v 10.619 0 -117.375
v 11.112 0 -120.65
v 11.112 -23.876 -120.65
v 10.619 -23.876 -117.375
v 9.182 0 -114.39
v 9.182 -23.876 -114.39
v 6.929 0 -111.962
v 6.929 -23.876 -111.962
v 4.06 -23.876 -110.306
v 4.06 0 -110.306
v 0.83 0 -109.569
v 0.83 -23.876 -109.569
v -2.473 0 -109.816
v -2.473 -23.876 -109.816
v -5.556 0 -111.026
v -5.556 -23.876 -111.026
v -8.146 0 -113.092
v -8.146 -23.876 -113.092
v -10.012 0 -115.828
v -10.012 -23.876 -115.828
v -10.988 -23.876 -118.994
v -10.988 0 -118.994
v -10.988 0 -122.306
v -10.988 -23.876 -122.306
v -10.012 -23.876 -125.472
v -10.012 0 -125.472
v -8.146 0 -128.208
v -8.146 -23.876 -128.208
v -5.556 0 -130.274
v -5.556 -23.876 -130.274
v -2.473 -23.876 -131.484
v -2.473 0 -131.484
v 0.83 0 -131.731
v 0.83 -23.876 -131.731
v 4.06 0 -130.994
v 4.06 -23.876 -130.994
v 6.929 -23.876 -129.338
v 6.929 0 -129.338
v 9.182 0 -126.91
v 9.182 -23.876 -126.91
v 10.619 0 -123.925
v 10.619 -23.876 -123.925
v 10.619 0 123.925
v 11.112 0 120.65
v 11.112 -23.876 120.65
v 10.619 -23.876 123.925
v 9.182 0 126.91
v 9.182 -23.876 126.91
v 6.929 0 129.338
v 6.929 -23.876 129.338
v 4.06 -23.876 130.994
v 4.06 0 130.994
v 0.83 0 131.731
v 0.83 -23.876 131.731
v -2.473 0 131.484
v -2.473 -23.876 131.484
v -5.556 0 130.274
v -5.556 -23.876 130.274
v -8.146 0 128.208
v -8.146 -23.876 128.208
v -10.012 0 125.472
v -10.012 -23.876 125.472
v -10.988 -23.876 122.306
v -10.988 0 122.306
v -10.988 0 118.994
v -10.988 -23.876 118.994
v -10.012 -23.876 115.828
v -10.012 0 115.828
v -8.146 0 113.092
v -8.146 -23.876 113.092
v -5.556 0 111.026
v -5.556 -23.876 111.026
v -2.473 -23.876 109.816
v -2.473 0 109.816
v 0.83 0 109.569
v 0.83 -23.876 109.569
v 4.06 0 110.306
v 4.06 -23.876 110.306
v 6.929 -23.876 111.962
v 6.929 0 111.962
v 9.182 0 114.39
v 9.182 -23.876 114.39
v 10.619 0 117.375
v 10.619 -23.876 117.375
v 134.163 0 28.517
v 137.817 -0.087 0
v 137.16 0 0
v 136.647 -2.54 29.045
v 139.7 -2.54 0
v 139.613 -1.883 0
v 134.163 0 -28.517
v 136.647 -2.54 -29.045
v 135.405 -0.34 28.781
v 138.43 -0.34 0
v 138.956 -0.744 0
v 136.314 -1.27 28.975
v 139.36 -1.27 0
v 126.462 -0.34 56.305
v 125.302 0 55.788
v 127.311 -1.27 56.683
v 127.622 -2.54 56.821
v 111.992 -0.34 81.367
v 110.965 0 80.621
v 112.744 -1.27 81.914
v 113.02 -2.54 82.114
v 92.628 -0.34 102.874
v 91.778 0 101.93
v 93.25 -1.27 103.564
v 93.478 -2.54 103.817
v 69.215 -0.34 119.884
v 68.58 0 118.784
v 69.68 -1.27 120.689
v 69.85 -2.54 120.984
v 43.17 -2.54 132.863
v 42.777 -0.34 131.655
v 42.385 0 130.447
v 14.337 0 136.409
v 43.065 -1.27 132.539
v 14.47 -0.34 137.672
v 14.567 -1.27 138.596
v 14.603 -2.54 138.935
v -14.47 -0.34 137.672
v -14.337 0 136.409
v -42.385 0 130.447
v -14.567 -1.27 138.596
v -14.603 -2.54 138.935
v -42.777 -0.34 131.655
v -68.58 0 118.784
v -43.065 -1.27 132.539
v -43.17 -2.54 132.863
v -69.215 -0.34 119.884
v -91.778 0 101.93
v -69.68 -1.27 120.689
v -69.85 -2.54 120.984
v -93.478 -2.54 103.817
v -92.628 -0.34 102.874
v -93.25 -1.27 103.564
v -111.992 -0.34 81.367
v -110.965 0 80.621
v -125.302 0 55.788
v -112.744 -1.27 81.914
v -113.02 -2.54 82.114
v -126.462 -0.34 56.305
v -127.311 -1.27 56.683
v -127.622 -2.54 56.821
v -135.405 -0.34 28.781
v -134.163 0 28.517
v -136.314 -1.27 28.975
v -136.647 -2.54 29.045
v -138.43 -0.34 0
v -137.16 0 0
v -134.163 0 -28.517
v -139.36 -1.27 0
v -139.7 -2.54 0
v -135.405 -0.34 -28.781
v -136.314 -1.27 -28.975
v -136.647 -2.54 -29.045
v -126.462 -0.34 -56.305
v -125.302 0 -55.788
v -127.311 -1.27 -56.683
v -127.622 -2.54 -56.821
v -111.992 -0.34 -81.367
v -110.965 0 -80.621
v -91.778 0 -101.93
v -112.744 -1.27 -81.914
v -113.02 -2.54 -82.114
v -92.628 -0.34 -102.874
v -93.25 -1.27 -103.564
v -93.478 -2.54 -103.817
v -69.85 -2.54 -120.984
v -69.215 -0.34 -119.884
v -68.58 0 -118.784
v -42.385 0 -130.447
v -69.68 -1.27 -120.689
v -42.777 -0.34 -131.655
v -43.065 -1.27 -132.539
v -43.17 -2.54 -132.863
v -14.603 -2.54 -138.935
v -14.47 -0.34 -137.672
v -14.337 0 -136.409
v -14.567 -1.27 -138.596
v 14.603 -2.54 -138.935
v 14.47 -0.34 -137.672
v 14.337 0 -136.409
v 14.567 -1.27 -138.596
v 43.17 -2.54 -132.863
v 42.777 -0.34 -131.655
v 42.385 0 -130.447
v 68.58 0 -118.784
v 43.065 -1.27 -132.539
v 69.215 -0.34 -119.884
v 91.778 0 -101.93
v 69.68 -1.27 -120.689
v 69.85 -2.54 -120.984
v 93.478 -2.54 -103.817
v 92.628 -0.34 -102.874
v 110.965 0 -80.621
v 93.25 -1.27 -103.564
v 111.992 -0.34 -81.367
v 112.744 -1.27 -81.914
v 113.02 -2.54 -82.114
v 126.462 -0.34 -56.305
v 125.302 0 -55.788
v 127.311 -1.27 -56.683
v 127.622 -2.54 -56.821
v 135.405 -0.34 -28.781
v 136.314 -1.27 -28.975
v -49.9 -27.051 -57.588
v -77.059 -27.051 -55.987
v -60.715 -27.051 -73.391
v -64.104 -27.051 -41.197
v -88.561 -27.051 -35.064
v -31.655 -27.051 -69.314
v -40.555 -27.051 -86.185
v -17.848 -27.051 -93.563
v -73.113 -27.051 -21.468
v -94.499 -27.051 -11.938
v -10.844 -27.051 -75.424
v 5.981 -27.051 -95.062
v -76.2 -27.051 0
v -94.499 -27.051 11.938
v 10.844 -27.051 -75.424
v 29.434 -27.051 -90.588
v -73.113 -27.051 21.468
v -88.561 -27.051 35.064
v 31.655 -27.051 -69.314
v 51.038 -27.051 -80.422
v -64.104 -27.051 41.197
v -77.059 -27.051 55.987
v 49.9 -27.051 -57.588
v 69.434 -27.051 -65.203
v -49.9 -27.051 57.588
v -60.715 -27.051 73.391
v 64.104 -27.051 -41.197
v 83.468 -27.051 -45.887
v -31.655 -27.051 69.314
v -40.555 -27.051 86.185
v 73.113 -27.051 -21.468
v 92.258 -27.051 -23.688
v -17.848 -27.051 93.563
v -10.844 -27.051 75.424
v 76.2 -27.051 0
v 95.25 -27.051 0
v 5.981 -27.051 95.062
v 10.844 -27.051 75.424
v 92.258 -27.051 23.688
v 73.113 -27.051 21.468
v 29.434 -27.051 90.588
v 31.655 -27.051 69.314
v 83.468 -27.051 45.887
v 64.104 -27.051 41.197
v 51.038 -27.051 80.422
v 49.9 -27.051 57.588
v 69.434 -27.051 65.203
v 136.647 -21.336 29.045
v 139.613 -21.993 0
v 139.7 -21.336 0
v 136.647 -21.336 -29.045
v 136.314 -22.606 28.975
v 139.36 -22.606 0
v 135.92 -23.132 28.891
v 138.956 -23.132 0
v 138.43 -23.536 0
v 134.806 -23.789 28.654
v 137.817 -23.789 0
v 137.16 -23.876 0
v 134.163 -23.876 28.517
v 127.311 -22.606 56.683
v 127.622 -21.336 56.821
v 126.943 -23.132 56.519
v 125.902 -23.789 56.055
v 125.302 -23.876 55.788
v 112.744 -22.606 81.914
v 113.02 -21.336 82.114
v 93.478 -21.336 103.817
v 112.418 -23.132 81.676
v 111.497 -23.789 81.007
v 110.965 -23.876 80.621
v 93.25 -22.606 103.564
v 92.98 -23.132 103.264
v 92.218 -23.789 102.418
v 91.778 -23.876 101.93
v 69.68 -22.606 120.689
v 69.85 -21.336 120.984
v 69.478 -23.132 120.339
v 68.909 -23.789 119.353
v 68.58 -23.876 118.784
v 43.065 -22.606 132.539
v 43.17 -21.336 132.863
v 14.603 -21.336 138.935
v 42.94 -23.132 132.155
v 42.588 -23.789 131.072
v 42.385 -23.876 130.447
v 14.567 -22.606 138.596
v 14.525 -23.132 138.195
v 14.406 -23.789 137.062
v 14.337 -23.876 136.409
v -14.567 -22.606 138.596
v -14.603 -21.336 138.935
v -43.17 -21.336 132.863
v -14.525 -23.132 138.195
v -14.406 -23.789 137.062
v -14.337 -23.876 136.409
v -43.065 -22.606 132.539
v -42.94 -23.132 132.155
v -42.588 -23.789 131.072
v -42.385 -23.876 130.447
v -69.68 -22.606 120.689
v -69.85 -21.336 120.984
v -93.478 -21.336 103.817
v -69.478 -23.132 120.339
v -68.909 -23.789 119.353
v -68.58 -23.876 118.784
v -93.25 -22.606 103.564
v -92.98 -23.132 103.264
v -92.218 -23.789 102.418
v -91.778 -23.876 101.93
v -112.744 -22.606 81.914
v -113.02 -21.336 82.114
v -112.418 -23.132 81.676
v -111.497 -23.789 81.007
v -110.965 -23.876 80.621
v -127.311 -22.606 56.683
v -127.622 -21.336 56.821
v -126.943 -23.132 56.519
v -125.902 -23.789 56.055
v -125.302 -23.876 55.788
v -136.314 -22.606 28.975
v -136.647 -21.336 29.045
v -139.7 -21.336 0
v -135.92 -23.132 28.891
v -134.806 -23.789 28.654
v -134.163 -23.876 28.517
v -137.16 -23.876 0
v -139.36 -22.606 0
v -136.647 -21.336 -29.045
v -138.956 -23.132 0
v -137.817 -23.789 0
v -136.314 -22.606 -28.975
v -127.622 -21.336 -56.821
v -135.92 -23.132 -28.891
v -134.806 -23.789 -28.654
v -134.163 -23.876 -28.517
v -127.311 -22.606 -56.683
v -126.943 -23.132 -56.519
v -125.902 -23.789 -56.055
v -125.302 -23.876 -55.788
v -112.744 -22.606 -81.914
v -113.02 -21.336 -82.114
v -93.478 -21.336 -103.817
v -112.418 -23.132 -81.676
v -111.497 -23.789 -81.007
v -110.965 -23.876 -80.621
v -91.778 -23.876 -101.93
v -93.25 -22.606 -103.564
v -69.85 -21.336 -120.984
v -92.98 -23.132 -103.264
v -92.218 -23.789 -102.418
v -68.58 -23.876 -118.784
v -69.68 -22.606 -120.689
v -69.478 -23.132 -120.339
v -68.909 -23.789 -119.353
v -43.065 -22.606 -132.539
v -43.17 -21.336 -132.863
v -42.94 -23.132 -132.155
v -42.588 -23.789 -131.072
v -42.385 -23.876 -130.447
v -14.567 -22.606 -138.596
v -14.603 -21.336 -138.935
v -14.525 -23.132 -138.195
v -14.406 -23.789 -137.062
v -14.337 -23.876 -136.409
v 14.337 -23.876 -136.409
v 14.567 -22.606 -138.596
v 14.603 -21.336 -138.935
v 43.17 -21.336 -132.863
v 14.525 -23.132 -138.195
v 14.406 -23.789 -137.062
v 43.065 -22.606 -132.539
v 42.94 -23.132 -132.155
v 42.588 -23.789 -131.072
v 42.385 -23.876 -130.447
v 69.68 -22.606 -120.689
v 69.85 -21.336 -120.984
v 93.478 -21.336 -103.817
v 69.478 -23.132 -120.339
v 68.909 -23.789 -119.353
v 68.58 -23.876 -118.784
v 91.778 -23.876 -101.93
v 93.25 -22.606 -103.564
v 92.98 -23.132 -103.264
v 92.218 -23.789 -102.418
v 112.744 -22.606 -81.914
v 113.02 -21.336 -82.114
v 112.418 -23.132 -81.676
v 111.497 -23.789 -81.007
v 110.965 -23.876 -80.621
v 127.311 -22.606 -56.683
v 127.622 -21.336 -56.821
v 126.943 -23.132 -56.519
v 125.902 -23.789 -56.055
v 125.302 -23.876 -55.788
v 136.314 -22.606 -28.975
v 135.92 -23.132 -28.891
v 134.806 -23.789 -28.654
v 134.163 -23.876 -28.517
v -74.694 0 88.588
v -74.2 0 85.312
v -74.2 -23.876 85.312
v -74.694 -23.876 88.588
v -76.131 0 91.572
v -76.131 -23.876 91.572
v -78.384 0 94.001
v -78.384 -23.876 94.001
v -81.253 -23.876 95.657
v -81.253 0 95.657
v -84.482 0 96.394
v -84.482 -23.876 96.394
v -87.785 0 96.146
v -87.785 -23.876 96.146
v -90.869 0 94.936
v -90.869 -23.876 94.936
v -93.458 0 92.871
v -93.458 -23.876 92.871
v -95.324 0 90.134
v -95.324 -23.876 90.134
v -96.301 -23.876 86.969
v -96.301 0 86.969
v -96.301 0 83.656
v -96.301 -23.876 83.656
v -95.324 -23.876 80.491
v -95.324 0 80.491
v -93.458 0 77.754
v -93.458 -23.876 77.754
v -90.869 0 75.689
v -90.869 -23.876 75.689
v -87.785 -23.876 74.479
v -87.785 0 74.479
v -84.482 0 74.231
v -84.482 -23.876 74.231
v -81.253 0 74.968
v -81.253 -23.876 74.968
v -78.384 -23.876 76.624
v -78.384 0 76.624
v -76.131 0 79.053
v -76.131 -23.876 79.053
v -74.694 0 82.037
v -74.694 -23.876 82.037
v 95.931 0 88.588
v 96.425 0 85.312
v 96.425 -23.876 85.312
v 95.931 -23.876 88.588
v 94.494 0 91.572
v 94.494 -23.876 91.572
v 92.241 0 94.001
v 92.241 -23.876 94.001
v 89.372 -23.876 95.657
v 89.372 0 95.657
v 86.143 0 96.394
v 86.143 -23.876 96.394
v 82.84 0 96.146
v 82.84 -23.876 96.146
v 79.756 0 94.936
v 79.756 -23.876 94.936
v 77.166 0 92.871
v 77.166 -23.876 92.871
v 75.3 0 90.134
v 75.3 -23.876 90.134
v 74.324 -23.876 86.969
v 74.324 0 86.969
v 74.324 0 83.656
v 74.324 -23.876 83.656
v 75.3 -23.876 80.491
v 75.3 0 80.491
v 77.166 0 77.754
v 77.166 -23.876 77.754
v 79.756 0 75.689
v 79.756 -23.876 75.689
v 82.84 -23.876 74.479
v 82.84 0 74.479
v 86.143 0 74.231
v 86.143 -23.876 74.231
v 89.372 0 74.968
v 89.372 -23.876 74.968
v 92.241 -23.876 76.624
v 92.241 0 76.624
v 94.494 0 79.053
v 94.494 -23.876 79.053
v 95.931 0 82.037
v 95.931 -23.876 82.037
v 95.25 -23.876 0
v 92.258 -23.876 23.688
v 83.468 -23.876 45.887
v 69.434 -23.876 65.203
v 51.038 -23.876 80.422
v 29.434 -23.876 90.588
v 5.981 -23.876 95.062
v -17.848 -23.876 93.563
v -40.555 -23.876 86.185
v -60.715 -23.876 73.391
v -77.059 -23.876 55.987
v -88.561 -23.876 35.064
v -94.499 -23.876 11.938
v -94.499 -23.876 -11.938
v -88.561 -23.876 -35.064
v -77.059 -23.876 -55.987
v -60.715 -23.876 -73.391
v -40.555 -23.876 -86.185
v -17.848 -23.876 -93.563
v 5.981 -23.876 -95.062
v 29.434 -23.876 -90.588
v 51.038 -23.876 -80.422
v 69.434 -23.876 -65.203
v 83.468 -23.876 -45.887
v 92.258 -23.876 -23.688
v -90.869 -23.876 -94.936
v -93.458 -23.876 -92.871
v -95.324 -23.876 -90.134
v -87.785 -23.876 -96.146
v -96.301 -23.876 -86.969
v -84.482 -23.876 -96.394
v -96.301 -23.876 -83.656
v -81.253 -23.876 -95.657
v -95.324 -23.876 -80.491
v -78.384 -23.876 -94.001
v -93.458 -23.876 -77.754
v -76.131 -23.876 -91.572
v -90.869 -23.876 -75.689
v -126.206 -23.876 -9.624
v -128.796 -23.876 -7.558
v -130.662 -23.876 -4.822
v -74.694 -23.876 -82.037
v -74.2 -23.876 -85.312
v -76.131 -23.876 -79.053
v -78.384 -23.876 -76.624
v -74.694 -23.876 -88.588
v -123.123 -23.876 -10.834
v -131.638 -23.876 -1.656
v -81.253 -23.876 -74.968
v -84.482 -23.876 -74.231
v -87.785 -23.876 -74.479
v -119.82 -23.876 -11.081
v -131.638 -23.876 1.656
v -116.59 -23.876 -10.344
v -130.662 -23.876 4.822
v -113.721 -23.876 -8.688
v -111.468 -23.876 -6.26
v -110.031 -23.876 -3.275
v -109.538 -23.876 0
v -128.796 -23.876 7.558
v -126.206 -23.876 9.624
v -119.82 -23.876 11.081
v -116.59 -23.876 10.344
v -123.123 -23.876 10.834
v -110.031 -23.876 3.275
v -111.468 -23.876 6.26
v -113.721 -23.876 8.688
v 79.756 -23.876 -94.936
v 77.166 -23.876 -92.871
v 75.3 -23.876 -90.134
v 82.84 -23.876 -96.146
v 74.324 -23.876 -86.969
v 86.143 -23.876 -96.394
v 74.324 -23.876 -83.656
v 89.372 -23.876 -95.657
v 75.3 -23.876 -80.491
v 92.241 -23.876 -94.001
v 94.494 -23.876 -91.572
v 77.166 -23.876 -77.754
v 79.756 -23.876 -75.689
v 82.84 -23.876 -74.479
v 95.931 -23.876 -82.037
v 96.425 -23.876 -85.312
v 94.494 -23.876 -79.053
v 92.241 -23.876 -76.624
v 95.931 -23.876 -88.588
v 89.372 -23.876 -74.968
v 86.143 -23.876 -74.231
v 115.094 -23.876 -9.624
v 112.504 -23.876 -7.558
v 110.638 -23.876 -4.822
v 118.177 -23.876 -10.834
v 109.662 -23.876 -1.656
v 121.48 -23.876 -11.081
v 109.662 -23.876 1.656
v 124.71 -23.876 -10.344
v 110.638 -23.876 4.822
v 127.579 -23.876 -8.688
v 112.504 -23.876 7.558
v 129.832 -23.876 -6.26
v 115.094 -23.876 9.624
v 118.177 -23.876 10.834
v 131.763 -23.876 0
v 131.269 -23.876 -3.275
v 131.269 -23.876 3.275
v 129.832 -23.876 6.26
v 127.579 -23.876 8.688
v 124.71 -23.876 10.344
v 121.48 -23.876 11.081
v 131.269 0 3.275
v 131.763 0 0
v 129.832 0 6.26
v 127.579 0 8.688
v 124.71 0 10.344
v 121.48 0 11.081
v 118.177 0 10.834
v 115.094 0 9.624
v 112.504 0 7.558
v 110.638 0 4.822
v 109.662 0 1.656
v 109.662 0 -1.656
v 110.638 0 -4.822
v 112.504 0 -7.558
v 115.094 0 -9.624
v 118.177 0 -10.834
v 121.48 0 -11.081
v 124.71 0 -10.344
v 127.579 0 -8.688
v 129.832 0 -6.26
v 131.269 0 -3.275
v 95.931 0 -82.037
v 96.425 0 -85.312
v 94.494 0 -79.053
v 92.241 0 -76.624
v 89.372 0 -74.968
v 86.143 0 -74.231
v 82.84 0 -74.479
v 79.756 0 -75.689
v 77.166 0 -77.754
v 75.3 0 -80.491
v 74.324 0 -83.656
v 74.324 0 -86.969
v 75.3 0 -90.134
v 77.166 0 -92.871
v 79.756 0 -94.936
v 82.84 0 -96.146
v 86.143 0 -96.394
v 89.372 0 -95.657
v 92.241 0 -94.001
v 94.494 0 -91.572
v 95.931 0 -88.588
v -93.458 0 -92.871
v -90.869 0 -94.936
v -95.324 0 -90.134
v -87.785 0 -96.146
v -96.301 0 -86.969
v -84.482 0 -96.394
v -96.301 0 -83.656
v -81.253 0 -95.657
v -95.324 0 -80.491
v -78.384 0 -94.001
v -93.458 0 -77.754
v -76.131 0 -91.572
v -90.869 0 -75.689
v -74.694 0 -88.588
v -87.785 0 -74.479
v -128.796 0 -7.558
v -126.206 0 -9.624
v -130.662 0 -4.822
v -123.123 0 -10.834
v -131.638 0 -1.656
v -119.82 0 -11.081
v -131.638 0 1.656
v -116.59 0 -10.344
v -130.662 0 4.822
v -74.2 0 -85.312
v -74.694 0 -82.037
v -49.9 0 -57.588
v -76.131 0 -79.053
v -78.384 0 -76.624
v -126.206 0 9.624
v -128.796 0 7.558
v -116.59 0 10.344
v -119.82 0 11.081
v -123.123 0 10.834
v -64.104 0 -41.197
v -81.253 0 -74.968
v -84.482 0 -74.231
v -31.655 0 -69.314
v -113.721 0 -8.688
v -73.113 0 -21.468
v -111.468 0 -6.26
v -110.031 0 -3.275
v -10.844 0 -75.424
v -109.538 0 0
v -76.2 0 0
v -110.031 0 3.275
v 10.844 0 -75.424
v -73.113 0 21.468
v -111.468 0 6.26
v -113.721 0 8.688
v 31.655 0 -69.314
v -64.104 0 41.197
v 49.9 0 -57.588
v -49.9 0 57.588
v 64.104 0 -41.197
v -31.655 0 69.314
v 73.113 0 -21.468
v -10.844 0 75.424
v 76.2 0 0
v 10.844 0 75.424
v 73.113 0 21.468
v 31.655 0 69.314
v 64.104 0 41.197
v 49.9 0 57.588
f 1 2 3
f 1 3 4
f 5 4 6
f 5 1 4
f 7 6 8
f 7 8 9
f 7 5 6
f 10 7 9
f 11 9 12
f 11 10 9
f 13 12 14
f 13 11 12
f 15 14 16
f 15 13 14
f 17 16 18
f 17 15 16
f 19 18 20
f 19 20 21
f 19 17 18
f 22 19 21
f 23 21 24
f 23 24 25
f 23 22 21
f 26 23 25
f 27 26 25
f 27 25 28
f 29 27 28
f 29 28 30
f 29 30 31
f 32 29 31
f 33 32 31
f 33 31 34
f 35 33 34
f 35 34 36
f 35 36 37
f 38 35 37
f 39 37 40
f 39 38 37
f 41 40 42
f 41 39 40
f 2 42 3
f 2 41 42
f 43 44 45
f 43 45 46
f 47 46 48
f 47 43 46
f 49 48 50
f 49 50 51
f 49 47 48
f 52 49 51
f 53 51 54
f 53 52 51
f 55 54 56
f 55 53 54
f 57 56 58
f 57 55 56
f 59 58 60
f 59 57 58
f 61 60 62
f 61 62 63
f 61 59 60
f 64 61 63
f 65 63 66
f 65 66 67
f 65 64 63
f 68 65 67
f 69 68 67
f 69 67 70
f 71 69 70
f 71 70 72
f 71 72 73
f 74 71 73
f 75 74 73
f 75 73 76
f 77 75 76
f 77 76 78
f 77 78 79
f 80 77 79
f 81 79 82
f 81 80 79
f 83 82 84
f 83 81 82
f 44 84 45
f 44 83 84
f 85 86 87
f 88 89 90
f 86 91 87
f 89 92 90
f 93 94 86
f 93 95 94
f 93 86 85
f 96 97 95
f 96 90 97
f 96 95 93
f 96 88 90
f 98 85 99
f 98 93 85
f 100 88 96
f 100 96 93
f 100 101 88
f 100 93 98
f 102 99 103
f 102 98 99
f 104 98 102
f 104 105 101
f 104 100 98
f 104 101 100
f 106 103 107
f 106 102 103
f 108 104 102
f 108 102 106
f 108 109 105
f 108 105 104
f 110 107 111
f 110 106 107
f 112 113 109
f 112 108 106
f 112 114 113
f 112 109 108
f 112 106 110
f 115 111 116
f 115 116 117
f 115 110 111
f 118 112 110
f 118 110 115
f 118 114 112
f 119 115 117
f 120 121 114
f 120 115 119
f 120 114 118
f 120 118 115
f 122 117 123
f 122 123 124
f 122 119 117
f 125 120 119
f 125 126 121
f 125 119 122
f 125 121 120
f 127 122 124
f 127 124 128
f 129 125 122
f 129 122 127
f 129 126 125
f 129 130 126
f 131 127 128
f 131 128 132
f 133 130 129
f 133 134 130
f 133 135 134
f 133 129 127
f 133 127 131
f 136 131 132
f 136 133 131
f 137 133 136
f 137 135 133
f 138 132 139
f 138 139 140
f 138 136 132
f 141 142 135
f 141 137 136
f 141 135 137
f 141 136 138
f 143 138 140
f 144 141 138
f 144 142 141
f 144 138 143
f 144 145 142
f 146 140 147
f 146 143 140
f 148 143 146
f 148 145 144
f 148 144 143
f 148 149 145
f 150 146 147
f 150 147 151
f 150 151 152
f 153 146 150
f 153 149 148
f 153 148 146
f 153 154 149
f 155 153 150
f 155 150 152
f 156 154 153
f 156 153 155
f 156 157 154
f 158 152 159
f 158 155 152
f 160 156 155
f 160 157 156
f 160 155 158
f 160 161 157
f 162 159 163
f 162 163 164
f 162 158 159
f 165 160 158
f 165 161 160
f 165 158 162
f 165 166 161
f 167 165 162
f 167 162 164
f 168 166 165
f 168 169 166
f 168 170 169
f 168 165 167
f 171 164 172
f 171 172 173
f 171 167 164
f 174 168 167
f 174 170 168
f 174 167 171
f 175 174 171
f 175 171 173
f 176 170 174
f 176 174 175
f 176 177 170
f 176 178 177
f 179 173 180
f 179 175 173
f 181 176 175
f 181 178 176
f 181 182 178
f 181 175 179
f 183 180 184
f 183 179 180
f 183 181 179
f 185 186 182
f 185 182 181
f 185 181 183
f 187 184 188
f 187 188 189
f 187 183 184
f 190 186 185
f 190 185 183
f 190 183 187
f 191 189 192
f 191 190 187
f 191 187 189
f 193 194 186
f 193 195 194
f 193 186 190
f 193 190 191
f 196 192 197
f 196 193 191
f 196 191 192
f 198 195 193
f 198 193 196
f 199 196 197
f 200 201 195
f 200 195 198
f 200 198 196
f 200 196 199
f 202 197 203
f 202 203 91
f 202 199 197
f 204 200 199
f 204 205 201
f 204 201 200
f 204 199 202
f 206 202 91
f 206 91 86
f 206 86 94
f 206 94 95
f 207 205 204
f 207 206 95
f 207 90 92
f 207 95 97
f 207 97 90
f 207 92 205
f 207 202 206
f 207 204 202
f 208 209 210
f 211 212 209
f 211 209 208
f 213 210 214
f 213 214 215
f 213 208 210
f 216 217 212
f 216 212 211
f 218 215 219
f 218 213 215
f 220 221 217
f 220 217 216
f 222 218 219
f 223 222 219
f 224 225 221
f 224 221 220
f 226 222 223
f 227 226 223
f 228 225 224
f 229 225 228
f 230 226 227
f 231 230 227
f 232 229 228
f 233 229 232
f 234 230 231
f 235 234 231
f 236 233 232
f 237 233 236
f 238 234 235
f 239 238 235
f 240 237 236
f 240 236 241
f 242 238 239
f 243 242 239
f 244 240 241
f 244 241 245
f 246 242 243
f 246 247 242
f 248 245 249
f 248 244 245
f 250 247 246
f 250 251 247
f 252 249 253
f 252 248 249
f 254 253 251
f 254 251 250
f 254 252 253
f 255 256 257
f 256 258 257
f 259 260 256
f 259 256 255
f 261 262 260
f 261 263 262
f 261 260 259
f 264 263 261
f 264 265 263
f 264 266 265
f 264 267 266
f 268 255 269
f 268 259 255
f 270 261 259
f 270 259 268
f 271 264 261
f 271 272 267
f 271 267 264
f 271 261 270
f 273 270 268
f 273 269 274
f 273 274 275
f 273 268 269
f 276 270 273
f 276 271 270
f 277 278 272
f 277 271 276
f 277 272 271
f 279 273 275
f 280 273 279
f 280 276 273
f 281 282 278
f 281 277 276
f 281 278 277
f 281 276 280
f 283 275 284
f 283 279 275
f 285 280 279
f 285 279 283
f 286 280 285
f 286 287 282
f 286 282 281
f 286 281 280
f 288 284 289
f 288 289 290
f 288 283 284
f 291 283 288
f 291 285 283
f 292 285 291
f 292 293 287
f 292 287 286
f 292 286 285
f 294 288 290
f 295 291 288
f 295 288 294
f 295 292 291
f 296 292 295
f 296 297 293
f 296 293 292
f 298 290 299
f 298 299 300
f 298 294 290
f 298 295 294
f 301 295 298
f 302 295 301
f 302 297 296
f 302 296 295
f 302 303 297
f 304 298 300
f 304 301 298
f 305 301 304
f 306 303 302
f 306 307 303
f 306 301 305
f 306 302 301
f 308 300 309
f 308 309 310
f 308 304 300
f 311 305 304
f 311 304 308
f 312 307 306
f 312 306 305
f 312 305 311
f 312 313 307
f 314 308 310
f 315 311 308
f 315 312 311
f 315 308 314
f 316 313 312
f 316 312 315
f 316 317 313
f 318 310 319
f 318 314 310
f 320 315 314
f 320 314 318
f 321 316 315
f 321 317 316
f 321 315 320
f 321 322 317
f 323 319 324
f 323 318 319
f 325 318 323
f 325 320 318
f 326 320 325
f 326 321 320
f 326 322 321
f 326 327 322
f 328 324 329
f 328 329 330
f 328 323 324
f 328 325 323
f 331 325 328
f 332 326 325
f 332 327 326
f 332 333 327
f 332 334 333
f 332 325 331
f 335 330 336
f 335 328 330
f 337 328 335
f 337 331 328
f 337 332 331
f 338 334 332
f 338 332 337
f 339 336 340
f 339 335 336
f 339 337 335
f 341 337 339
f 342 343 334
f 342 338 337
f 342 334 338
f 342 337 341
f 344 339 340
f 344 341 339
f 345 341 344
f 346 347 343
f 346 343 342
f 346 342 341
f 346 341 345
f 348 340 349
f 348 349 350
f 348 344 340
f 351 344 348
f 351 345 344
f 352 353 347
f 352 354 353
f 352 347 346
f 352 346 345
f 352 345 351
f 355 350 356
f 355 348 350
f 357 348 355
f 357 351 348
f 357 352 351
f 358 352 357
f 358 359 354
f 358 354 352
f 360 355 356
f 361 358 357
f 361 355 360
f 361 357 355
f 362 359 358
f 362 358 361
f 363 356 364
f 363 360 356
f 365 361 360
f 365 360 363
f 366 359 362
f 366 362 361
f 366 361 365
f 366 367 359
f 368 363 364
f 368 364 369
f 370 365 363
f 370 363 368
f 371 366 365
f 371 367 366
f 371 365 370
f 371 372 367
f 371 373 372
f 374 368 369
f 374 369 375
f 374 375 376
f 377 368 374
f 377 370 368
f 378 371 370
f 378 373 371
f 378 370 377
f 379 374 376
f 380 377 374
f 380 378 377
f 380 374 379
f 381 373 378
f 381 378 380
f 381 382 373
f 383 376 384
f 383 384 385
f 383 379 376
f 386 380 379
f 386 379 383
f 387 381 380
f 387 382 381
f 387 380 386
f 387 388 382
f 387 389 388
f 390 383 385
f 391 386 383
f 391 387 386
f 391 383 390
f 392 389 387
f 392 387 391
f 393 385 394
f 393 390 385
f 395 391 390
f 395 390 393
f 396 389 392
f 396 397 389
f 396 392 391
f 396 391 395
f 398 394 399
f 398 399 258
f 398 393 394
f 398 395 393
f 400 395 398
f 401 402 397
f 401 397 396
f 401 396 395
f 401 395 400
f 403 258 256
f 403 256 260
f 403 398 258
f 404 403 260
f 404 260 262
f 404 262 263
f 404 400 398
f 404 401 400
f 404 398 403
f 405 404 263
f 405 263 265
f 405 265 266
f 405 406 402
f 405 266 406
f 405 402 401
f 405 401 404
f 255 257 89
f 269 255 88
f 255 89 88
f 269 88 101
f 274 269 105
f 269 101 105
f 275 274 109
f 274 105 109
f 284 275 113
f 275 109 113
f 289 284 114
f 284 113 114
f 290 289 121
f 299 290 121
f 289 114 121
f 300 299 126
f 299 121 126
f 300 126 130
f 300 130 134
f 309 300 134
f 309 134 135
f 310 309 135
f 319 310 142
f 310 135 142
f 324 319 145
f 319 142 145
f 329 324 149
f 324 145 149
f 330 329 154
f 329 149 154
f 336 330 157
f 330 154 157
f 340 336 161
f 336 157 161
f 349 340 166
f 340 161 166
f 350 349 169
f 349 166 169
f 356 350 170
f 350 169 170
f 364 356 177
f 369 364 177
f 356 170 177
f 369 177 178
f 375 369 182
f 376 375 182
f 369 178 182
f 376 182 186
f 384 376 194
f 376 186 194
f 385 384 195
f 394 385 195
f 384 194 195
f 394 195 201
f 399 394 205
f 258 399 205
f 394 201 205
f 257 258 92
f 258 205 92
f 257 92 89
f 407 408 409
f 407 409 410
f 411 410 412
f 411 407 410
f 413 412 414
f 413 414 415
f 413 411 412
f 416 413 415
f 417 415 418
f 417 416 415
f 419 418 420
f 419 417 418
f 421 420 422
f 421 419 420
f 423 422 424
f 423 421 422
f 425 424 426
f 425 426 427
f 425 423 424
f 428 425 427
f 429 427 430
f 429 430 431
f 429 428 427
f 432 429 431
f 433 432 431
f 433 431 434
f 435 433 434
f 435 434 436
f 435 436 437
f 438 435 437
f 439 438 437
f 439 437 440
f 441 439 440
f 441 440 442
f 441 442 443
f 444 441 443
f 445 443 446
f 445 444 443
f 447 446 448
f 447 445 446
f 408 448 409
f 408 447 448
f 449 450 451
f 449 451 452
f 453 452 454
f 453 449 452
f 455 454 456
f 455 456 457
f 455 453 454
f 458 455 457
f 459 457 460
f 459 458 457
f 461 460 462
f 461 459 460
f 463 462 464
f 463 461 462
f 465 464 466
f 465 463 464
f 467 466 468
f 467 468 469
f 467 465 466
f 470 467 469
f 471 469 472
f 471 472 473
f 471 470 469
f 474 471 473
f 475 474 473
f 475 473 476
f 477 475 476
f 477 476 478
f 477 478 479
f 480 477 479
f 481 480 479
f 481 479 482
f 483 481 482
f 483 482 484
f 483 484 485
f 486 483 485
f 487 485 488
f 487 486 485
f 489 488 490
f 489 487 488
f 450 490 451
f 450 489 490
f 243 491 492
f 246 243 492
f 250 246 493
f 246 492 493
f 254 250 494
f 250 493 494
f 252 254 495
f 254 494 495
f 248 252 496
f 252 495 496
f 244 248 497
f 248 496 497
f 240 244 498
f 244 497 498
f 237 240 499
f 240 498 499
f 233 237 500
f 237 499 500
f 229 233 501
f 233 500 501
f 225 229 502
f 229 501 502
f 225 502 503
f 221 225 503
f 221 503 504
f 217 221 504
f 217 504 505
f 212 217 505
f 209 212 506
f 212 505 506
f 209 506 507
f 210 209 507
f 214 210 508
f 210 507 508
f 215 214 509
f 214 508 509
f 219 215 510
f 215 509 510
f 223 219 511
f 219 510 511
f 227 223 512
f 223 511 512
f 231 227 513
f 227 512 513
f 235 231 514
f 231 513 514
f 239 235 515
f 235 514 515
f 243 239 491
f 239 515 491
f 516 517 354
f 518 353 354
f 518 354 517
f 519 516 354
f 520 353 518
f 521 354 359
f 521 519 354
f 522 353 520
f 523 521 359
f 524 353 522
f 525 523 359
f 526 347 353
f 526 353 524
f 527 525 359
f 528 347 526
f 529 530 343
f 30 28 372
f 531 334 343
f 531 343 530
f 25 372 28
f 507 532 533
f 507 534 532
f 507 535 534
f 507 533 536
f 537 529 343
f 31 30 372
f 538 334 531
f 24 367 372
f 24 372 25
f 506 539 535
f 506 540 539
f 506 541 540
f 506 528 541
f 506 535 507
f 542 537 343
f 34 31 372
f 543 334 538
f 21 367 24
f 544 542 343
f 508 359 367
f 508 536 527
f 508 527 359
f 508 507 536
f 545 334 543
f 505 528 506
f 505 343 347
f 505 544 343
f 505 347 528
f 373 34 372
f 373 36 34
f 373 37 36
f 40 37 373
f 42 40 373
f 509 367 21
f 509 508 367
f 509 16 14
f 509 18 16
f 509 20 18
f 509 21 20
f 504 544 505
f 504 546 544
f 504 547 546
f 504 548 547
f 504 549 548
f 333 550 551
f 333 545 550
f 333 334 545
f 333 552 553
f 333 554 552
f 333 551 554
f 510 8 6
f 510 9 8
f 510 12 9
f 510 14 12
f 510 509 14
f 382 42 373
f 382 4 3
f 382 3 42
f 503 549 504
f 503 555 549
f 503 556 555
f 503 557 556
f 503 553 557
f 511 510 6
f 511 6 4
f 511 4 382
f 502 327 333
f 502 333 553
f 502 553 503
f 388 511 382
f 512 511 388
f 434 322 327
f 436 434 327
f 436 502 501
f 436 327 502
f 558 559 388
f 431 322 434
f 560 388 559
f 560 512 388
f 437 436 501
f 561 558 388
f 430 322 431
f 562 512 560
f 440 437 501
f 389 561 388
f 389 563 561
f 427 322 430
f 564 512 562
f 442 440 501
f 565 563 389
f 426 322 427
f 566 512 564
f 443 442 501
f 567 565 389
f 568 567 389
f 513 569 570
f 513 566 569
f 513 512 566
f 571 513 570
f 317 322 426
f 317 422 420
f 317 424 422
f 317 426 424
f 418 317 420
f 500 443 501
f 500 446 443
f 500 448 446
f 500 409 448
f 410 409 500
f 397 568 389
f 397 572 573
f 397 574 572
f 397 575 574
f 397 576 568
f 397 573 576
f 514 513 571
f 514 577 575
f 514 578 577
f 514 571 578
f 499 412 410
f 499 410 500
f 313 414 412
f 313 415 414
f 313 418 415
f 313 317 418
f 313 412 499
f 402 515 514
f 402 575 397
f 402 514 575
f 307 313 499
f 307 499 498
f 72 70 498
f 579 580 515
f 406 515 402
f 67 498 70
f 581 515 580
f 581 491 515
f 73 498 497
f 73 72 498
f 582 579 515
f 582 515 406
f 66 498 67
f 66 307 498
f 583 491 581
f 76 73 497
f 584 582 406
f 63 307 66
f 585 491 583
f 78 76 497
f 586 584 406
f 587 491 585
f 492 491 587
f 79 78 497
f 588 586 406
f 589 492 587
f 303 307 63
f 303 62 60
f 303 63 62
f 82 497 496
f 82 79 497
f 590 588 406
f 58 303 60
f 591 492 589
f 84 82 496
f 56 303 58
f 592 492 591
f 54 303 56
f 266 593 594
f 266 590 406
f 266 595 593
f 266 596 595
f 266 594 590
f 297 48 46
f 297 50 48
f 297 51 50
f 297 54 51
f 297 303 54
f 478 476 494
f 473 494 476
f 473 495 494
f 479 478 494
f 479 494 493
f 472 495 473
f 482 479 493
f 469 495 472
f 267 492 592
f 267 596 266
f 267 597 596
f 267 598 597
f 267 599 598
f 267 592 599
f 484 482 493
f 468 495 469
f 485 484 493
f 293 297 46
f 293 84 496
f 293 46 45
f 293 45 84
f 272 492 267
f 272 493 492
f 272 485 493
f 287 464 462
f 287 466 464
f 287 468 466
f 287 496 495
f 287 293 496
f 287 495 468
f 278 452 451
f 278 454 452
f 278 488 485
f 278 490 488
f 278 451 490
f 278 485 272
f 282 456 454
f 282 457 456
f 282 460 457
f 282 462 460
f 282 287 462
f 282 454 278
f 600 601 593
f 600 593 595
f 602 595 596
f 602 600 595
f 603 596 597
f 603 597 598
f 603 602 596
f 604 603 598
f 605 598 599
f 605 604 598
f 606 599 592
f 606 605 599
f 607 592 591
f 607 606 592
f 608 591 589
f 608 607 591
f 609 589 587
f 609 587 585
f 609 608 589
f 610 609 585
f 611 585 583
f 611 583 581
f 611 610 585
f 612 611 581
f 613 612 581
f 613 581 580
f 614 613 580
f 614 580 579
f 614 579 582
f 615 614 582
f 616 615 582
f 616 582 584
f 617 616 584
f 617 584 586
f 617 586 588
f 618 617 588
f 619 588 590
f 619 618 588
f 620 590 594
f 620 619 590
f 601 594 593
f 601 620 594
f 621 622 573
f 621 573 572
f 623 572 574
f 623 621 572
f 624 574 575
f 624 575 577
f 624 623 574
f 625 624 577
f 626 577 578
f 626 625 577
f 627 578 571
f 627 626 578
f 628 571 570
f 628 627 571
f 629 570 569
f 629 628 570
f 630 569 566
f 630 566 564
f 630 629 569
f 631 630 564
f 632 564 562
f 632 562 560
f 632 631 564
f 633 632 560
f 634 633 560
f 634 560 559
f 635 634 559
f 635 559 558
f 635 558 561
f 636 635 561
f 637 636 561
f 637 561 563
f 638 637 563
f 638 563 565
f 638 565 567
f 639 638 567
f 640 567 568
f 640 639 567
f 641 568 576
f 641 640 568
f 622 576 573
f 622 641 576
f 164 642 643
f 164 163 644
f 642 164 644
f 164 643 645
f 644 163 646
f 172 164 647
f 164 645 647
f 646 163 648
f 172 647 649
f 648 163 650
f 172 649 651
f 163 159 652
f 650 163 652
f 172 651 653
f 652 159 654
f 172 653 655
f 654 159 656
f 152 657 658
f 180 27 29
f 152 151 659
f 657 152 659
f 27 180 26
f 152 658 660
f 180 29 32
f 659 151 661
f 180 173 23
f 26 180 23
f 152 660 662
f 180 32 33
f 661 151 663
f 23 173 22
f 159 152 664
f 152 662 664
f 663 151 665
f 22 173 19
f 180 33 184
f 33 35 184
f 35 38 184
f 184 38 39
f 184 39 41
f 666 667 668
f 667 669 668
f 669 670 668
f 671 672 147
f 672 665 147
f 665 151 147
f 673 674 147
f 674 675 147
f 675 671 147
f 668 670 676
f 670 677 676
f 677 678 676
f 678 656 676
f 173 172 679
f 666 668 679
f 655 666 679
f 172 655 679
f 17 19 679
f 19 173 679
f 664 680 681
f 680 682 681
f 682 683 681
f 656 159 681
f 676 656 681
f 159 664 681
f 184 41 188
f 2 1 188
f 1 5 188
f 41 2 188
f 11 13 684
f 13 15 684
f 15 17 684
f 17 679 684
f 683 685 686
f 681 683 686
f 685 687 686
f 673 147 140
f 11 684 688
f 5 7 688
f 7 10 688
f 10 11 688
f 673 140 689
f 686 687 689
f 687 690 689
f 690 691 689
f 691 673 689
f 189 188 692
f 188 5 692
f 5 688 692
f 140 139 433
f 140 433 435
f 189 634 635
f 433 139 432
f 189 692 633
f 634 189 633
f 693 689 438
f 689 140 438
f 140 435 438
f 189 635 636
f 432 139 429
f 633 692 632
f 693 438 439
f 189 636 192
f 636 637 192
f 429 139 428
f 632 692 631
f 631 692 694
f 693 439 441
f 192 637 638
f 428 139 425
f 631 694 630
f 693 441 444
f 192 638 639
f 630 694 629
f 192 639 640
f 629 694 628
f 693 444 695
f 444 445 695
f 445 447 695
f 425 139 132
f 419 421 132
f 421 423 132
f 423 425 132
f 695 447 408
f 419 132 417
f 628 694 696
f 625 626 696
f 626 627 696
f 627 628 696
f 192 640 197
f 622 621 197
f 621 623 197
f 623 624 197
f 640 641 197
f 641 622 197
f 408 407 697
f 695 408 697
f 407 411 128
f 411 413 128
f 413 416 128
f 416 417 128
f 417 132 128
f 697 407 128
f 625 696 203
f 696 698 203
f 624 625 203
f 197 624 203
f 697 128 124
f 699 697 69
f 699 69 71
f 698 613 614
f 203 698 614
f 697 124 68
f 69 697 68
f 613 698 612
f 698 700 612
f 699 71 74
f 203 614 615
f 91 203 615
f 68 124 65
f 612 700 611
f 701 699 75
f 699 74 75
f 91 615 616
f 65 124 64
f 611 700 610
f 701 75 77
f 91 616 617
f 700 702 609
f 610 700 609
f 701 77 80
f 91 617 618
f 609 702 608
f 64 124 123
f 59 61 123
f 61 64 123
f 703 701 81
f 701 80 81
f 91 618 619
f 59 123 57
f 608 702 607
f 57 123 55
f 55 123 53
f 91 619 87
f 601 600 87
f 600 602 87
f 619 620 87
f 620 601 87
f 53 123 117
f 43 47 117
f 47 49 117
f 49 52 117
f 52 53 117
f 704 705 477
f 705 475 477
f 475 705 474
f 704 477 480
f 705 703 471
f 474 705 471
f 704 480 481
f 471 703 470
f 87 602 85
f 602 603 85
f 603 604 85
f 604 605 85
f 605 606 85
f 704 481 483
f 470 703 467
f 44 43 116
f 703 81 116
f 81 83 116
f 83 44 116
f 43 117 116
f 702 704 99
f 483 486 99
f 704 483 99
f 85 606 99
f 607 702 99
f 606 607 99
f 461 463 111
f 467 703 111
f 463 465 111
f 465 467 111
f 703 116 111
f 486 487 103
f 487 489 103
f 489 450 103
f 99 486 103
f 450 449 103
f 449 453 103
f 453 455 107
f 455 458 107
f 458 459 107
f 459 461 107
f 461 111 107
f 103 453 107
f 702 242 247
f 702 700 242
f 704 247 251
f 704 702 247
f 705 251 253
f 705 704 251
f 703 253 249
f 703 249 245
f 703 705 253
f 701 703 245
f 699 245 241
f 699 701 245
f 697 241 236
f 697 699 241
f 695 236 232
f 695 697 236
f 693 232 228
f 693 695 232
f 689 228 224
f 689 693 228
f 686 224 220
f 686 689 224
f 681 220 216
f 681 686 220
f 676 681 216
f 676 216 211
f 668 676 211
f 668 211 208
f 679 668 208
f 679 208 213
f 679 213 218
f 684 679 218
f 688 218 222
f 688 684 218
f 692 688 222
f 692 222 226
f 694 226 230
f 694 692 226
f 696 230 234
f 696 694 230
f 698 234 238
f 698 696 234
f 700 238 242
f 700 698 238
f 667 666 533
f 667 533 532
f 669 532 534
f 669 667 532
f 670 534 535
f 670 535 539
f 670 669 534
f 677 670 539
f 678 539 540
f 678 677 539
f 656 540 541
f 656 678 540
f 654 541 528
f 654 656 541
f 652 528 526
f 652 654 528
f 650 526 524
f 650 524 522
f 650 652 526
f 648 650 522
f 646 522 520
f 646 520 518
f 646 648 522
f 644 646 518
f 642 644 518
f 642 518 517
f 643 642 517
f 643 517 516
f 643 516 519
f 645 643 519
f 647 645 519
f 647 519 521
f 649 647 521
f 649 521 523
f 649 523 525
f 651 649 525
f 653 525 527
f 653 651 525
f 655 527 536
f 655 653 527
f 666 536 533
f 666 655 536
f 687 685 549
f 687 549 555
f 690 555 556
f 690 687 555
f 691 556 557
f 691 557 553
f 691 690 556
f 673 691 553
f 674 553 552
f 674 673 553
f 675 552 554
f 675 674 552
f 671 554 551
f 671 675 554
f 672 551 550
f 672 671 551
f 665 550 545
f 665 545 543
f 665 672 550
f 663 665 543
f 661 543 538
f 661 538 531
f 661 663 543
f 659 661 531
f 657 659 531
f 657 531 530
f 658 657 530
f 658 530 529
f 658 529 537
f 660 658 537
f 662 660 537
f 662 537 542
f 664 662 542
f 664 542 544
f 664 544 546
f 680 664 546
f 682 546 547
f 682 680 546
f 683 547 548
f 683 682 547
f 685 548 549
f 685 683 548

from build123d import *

# Parameters (mm, degrees)
F0_R     = 139.7
F0_R_2   = 11.1125
F0_R_3   = 76.2
F1_DEPTH = 23.876
F2_R     = 95.25
F2_R_2   = 76.2
F3_DEPTH = 3.175
F4_R     = 2.54


with BuildPart() as f1:
    # F0 (on Front) → F1 (new body)
    with BuildSketch(Plane.XZ):
        Circle(F0_R)
        with Locations((-85.312433, -85.312433)):
            Circle(F0_R_2, mode=Mode.SUBTRACT)
        with Locations((0, -120.65)):
            Circle(F0_R_2, mode=Mode.SUBTRACT)
        with Locations((85.312433, -85.312433)):
            Circle(F0_R_2, mode=Mode.SUBTRACT)
        with Locations((-120.65, 0)):
            Circle(F0_R_2, mode=Mode.SUBTRACT)
        with Locations((-85.312433, 85.312433)):
            Circle(F0_R_2, mode=Mode.SUBTRACT)
        Circle(F0_R_3, mode=Mode.SUBTRACT)
        with Locations((120.65, 0)):
            Circle(F0_R_2, mode=Mode.SUBTRACT)
        with Locations((0, 120.65)):
            Circle(F0_R_2, mode=Mode.SUBTRACT)
        with Locations((85.312433, 85.312433)):
            Circle(F0_R_2, mode=Mode.SUBTRACT)
    extrude(amount=F1_DEPTH)

    # F2 (on face) → F3 (join)
    with BuildSketch(Plane.XZ.offset(23.876)):
        Circle(F2_R)
        Circle(F2_R_2, mode=Mode.SUBTRACT)
    extrude(amount=F3_DEPTH)

    # F4
    f4_edges = [f1.edges().sort_by_distance(p)[0] for p in [
        (-139.7, -23.876, 0),
        (-139.7, 0, 0),
    ]]
    fillet(f4_edges, radius=F4_R)


solid = f1.part
